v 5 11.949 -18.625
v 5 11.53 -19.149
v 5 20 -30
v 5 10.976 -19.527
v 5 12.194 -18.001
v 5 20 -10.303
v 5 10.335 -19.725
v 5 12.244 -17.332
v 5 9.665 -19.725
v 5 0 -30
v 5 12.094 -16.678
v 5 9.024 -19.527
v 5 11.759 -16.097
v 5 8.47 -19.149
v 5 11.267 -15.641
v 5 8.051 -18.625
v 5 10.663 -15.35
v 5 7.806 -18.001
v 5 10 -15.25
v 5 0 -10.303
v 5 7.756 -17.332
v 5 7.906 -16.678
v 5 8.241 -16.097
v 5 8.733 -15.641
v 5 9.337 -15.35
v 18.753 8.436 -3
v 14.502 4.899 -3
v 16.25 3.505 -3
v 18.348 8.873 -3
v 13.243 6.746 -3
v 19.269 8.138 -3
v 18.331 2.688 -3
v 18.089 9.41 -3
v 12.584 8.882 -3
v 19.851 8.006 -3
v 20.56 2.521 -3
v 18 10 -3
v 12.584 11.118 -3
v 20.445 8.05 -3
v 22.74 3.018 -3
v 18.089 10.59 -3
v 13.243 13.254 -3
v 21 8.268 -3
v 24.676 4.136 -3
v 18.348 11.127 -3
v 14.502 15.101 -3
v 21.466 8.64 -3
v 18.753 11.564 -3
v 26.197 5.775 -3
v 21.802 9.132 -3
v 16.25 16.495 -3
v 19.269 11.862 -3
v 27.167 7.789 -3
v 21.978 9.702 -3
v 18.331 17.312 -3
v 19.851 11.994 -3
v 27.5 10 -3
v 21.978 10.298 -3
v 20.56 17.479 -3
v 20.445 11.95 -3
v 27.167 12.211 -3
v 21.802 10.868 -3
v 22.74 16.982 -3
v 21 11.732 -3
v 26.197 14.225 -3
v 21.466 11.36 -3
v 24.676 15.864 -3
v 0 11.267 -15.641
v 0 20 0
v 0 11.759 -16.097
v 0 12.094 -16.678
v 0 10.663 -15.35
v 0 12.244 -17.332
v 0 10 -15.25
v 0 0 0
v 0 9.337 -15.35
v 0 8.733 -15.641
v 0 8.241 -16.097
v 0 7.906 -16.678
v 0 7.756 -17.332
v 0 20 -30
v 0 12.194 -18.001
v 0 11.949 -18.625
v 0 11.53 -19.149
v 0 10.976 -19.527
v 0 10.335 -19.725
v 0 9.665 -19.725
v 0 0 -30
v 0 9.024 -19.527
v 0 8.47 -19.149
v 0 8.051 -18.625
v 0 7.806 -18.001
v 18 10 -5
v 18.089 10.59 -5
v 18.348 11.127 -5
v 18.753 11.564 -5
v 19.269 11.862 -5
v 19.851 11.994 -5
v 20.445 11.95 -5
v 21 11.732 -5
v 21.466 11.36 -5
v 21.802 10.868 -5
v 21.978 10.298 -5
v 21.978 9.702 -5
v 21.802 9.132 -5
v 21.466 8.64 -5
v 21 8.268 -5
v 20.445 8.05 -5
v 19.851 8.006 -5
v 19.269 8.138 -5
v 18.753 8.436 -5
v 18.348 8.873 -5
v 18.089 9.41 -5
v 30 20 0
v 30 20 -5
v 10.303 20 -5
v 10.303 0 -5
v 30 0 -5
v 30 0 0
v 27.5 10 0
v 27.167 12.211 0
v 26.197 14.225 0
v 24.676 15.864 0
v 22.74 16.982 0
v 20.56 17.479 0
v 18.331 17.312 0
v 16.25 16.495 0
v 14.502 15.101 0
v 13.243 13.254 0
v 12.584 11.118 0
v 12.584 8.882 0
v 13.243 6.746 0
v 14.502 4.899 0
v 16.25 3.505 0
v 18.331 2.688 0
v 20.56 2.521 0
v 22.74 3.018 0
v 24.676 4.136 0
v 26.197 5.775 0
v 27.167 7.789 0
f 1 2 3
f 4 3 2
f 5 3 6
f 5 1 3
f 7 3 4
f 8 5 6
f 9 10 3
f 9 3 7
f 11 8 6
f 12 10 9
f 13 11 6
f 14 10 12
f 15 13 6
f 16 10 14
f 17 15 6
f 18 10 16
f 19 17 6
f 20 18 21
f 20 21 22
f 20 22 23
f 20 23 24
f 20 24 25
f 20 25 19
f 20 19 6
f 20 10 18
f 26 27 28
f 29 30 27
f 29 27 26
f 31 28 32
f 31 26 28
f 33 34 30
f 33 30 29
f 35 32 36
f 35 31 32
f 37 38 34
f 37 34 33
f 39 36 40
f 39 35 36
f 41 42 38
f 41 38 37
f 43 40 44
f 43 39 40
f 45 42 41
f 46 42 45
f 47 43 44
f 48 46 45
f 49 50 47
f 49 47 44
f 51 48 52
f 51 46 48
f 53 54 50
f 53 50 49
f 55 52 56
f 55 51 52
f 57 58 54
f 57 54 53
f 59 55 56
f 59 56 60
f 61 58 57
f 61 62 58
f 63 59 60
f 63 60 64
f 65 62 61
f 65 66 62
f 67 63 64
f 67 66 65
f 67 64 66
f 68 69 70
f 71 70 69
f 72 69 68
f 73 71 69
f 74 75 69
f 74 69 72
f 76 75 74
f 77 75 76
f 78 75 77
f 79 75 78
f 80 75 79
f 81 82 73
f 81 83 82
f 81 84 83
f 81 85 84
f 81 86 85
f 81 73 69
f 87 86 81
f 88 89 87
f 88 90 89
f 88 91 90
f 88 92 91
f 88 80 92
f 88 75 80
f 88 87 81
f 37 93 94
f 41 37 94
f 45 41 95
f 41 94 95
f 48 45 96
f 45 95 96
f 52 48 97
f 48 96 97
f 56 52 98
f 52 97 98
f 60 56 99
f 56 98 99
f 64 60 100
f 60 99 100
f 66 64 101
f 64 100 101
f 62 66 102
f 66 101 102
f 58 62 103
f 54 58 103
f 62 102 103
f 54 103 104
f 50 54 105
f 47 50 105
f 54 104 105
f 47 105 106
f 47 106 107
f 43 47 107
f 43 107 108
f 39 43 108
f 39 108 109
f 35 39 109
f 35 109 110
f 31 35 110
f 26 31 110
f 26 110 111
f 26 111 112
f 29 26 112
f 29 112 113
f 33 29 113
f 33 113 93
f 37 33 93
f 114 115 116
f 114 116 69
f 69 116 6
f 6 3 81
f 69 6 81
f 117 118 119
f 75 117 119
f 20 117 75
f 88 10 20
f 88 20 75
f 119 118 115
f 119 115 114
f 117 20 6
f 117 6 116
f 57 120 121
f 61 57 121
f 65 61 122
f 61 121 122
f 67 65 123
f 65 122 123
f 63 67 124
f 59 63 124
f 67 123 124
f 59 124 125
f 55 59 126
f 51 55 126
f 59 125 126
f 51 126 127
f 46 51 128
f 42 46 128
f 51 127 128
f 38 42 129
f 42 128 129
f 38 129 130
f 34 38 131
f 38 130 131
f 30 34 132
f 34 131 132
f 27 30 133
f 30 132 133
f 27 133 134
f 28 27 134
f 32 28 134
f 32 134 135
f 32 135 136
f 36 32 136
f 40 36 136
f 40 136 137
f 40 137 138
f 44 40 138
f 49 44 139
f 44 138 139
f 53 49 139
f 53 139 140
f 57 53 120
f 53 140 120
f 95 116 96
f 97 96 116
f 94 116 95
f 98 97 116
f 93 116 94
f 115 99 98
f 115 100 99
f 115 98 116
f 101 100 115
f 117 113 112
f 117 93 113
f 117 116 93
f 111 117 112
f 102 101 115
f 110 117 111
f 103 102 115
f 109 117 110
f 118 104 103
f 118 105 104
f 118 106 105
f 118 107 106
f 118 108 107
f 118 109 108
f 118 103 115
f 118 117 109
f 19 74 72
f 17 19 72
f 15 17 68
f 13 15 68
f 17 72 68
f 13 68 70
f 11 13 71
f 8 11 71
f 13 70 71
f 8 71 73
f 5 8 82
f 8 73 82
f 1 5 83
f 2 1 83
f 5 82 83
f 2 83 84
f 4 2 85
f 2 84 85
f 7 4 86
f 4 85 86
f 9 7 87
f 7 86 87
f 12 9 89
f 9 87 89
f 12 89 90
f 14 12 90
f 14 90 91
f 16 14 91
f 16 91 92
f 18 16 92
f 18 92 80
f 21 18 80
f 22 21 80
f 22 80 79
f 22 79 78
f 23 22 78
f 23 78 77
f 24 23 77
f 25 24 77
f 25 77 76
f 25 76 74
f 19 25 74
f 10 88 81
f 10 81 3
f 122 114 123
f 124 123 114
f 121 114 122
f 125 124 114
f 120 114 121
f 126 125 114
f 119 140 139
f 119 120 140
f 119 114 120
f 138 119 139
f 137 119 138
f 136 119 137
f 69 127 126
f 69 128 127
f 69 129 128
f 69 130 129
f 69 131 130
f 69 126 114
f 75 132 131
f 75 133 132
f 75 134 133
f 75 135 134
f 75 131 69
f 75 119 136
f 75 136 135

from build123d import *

# Parameters (mm, degrees)
ESTRUSIONE_ESTRUSIONE2_DEPTH = 20
FORO_PER_VITE_M4_2_D         = 4.5
FORO_PER_VITE_M4_2_DEPTH     = 15
FORO_PER_VITE_M4_2_TIP       = 1.351936393
SCHIZZO6_R                   = 7.5
TAGLIO_ESTRUSIONE1_DEPTH     = 3
FORO_PER_VITE_M4_1_D         = 4
FORO_PER_VITE_M4_1_DEPTH     = 9
FORO_PER_VITE_M4_1_TIP       = 1.201721238


with BuildPart() as part:
    # Schizzo2 → Estrusione-Estrusione2 (new body)
    with BuildSketch(Plane(origin=(0, 0, 0), x_dir=(1, 0, 0), z_dir=(0, 1, 0))):
        Polygon((5, 30), (5, 10.303300859), (10.303300859, 5), (30, 5), (30, 0), (0, 0), (0, 30), align=None)
    extrude(amount=ESTRUSIONE_ESTRUSIONE2_DEPTH)

    # Foro per Vite M4-2
    with Locations(Plane(origin=(5, 0, 0), x_dir=(0, 0, -1), z_dir=(1, 0, 0))):
        with Locations((17.5, 10)):
            Hole(FORO_PER_VITE_M4_2_D / 2, depth=FORO_PER_VITE_M4_2_DEPTH)
            with Locations((0, 0, -(FORO_PER_VITE_M4_2_DEPTH + FORO_PER_VITE_M4_2_TIP / 2))):  # 118° drill point
                Cone(0, FORO_PER_VITE_M4_2_D / 2, FORO_PER_VITE_M4_2_TIP, mode=Mode.SUBTRACT)

    # Schizzo6 → Taglio-Estrusione1 (cut)
    with BuildSketch(Plane.XY):
        with Locations((20, 10)):
            Circle(SCHIZZO6_R)
    extrude(amount=-TAGLIO_ESTRUSIONE1_DEPTH, mode=Mode.SUBTRACT)

    # Foro per Vite M4-1
    with Locations(Plane(origin=(20, 10, 0), x_dir=(1, 0, 0), z_dir=(0, 0, 1))):
        with Locations((0, 0)):
            Hole(FORO_PER_VITE_M4_1_D / 2, depth=FORO_PER_VITE_M4_1_DEPTH)
            with Locations((0, 0, -(FORO_PER_VITE_M4_1_DEPTH + FORO_PER_VITE_M4_1_TIP / 2))):  # 118° drill point
                Cone(0, FORO_PER_VITE_M4_1_D / 2, FORO_PER_VITE_M4_1_TIP, mode=Mode.SUBTRACT)


solid = part.part
